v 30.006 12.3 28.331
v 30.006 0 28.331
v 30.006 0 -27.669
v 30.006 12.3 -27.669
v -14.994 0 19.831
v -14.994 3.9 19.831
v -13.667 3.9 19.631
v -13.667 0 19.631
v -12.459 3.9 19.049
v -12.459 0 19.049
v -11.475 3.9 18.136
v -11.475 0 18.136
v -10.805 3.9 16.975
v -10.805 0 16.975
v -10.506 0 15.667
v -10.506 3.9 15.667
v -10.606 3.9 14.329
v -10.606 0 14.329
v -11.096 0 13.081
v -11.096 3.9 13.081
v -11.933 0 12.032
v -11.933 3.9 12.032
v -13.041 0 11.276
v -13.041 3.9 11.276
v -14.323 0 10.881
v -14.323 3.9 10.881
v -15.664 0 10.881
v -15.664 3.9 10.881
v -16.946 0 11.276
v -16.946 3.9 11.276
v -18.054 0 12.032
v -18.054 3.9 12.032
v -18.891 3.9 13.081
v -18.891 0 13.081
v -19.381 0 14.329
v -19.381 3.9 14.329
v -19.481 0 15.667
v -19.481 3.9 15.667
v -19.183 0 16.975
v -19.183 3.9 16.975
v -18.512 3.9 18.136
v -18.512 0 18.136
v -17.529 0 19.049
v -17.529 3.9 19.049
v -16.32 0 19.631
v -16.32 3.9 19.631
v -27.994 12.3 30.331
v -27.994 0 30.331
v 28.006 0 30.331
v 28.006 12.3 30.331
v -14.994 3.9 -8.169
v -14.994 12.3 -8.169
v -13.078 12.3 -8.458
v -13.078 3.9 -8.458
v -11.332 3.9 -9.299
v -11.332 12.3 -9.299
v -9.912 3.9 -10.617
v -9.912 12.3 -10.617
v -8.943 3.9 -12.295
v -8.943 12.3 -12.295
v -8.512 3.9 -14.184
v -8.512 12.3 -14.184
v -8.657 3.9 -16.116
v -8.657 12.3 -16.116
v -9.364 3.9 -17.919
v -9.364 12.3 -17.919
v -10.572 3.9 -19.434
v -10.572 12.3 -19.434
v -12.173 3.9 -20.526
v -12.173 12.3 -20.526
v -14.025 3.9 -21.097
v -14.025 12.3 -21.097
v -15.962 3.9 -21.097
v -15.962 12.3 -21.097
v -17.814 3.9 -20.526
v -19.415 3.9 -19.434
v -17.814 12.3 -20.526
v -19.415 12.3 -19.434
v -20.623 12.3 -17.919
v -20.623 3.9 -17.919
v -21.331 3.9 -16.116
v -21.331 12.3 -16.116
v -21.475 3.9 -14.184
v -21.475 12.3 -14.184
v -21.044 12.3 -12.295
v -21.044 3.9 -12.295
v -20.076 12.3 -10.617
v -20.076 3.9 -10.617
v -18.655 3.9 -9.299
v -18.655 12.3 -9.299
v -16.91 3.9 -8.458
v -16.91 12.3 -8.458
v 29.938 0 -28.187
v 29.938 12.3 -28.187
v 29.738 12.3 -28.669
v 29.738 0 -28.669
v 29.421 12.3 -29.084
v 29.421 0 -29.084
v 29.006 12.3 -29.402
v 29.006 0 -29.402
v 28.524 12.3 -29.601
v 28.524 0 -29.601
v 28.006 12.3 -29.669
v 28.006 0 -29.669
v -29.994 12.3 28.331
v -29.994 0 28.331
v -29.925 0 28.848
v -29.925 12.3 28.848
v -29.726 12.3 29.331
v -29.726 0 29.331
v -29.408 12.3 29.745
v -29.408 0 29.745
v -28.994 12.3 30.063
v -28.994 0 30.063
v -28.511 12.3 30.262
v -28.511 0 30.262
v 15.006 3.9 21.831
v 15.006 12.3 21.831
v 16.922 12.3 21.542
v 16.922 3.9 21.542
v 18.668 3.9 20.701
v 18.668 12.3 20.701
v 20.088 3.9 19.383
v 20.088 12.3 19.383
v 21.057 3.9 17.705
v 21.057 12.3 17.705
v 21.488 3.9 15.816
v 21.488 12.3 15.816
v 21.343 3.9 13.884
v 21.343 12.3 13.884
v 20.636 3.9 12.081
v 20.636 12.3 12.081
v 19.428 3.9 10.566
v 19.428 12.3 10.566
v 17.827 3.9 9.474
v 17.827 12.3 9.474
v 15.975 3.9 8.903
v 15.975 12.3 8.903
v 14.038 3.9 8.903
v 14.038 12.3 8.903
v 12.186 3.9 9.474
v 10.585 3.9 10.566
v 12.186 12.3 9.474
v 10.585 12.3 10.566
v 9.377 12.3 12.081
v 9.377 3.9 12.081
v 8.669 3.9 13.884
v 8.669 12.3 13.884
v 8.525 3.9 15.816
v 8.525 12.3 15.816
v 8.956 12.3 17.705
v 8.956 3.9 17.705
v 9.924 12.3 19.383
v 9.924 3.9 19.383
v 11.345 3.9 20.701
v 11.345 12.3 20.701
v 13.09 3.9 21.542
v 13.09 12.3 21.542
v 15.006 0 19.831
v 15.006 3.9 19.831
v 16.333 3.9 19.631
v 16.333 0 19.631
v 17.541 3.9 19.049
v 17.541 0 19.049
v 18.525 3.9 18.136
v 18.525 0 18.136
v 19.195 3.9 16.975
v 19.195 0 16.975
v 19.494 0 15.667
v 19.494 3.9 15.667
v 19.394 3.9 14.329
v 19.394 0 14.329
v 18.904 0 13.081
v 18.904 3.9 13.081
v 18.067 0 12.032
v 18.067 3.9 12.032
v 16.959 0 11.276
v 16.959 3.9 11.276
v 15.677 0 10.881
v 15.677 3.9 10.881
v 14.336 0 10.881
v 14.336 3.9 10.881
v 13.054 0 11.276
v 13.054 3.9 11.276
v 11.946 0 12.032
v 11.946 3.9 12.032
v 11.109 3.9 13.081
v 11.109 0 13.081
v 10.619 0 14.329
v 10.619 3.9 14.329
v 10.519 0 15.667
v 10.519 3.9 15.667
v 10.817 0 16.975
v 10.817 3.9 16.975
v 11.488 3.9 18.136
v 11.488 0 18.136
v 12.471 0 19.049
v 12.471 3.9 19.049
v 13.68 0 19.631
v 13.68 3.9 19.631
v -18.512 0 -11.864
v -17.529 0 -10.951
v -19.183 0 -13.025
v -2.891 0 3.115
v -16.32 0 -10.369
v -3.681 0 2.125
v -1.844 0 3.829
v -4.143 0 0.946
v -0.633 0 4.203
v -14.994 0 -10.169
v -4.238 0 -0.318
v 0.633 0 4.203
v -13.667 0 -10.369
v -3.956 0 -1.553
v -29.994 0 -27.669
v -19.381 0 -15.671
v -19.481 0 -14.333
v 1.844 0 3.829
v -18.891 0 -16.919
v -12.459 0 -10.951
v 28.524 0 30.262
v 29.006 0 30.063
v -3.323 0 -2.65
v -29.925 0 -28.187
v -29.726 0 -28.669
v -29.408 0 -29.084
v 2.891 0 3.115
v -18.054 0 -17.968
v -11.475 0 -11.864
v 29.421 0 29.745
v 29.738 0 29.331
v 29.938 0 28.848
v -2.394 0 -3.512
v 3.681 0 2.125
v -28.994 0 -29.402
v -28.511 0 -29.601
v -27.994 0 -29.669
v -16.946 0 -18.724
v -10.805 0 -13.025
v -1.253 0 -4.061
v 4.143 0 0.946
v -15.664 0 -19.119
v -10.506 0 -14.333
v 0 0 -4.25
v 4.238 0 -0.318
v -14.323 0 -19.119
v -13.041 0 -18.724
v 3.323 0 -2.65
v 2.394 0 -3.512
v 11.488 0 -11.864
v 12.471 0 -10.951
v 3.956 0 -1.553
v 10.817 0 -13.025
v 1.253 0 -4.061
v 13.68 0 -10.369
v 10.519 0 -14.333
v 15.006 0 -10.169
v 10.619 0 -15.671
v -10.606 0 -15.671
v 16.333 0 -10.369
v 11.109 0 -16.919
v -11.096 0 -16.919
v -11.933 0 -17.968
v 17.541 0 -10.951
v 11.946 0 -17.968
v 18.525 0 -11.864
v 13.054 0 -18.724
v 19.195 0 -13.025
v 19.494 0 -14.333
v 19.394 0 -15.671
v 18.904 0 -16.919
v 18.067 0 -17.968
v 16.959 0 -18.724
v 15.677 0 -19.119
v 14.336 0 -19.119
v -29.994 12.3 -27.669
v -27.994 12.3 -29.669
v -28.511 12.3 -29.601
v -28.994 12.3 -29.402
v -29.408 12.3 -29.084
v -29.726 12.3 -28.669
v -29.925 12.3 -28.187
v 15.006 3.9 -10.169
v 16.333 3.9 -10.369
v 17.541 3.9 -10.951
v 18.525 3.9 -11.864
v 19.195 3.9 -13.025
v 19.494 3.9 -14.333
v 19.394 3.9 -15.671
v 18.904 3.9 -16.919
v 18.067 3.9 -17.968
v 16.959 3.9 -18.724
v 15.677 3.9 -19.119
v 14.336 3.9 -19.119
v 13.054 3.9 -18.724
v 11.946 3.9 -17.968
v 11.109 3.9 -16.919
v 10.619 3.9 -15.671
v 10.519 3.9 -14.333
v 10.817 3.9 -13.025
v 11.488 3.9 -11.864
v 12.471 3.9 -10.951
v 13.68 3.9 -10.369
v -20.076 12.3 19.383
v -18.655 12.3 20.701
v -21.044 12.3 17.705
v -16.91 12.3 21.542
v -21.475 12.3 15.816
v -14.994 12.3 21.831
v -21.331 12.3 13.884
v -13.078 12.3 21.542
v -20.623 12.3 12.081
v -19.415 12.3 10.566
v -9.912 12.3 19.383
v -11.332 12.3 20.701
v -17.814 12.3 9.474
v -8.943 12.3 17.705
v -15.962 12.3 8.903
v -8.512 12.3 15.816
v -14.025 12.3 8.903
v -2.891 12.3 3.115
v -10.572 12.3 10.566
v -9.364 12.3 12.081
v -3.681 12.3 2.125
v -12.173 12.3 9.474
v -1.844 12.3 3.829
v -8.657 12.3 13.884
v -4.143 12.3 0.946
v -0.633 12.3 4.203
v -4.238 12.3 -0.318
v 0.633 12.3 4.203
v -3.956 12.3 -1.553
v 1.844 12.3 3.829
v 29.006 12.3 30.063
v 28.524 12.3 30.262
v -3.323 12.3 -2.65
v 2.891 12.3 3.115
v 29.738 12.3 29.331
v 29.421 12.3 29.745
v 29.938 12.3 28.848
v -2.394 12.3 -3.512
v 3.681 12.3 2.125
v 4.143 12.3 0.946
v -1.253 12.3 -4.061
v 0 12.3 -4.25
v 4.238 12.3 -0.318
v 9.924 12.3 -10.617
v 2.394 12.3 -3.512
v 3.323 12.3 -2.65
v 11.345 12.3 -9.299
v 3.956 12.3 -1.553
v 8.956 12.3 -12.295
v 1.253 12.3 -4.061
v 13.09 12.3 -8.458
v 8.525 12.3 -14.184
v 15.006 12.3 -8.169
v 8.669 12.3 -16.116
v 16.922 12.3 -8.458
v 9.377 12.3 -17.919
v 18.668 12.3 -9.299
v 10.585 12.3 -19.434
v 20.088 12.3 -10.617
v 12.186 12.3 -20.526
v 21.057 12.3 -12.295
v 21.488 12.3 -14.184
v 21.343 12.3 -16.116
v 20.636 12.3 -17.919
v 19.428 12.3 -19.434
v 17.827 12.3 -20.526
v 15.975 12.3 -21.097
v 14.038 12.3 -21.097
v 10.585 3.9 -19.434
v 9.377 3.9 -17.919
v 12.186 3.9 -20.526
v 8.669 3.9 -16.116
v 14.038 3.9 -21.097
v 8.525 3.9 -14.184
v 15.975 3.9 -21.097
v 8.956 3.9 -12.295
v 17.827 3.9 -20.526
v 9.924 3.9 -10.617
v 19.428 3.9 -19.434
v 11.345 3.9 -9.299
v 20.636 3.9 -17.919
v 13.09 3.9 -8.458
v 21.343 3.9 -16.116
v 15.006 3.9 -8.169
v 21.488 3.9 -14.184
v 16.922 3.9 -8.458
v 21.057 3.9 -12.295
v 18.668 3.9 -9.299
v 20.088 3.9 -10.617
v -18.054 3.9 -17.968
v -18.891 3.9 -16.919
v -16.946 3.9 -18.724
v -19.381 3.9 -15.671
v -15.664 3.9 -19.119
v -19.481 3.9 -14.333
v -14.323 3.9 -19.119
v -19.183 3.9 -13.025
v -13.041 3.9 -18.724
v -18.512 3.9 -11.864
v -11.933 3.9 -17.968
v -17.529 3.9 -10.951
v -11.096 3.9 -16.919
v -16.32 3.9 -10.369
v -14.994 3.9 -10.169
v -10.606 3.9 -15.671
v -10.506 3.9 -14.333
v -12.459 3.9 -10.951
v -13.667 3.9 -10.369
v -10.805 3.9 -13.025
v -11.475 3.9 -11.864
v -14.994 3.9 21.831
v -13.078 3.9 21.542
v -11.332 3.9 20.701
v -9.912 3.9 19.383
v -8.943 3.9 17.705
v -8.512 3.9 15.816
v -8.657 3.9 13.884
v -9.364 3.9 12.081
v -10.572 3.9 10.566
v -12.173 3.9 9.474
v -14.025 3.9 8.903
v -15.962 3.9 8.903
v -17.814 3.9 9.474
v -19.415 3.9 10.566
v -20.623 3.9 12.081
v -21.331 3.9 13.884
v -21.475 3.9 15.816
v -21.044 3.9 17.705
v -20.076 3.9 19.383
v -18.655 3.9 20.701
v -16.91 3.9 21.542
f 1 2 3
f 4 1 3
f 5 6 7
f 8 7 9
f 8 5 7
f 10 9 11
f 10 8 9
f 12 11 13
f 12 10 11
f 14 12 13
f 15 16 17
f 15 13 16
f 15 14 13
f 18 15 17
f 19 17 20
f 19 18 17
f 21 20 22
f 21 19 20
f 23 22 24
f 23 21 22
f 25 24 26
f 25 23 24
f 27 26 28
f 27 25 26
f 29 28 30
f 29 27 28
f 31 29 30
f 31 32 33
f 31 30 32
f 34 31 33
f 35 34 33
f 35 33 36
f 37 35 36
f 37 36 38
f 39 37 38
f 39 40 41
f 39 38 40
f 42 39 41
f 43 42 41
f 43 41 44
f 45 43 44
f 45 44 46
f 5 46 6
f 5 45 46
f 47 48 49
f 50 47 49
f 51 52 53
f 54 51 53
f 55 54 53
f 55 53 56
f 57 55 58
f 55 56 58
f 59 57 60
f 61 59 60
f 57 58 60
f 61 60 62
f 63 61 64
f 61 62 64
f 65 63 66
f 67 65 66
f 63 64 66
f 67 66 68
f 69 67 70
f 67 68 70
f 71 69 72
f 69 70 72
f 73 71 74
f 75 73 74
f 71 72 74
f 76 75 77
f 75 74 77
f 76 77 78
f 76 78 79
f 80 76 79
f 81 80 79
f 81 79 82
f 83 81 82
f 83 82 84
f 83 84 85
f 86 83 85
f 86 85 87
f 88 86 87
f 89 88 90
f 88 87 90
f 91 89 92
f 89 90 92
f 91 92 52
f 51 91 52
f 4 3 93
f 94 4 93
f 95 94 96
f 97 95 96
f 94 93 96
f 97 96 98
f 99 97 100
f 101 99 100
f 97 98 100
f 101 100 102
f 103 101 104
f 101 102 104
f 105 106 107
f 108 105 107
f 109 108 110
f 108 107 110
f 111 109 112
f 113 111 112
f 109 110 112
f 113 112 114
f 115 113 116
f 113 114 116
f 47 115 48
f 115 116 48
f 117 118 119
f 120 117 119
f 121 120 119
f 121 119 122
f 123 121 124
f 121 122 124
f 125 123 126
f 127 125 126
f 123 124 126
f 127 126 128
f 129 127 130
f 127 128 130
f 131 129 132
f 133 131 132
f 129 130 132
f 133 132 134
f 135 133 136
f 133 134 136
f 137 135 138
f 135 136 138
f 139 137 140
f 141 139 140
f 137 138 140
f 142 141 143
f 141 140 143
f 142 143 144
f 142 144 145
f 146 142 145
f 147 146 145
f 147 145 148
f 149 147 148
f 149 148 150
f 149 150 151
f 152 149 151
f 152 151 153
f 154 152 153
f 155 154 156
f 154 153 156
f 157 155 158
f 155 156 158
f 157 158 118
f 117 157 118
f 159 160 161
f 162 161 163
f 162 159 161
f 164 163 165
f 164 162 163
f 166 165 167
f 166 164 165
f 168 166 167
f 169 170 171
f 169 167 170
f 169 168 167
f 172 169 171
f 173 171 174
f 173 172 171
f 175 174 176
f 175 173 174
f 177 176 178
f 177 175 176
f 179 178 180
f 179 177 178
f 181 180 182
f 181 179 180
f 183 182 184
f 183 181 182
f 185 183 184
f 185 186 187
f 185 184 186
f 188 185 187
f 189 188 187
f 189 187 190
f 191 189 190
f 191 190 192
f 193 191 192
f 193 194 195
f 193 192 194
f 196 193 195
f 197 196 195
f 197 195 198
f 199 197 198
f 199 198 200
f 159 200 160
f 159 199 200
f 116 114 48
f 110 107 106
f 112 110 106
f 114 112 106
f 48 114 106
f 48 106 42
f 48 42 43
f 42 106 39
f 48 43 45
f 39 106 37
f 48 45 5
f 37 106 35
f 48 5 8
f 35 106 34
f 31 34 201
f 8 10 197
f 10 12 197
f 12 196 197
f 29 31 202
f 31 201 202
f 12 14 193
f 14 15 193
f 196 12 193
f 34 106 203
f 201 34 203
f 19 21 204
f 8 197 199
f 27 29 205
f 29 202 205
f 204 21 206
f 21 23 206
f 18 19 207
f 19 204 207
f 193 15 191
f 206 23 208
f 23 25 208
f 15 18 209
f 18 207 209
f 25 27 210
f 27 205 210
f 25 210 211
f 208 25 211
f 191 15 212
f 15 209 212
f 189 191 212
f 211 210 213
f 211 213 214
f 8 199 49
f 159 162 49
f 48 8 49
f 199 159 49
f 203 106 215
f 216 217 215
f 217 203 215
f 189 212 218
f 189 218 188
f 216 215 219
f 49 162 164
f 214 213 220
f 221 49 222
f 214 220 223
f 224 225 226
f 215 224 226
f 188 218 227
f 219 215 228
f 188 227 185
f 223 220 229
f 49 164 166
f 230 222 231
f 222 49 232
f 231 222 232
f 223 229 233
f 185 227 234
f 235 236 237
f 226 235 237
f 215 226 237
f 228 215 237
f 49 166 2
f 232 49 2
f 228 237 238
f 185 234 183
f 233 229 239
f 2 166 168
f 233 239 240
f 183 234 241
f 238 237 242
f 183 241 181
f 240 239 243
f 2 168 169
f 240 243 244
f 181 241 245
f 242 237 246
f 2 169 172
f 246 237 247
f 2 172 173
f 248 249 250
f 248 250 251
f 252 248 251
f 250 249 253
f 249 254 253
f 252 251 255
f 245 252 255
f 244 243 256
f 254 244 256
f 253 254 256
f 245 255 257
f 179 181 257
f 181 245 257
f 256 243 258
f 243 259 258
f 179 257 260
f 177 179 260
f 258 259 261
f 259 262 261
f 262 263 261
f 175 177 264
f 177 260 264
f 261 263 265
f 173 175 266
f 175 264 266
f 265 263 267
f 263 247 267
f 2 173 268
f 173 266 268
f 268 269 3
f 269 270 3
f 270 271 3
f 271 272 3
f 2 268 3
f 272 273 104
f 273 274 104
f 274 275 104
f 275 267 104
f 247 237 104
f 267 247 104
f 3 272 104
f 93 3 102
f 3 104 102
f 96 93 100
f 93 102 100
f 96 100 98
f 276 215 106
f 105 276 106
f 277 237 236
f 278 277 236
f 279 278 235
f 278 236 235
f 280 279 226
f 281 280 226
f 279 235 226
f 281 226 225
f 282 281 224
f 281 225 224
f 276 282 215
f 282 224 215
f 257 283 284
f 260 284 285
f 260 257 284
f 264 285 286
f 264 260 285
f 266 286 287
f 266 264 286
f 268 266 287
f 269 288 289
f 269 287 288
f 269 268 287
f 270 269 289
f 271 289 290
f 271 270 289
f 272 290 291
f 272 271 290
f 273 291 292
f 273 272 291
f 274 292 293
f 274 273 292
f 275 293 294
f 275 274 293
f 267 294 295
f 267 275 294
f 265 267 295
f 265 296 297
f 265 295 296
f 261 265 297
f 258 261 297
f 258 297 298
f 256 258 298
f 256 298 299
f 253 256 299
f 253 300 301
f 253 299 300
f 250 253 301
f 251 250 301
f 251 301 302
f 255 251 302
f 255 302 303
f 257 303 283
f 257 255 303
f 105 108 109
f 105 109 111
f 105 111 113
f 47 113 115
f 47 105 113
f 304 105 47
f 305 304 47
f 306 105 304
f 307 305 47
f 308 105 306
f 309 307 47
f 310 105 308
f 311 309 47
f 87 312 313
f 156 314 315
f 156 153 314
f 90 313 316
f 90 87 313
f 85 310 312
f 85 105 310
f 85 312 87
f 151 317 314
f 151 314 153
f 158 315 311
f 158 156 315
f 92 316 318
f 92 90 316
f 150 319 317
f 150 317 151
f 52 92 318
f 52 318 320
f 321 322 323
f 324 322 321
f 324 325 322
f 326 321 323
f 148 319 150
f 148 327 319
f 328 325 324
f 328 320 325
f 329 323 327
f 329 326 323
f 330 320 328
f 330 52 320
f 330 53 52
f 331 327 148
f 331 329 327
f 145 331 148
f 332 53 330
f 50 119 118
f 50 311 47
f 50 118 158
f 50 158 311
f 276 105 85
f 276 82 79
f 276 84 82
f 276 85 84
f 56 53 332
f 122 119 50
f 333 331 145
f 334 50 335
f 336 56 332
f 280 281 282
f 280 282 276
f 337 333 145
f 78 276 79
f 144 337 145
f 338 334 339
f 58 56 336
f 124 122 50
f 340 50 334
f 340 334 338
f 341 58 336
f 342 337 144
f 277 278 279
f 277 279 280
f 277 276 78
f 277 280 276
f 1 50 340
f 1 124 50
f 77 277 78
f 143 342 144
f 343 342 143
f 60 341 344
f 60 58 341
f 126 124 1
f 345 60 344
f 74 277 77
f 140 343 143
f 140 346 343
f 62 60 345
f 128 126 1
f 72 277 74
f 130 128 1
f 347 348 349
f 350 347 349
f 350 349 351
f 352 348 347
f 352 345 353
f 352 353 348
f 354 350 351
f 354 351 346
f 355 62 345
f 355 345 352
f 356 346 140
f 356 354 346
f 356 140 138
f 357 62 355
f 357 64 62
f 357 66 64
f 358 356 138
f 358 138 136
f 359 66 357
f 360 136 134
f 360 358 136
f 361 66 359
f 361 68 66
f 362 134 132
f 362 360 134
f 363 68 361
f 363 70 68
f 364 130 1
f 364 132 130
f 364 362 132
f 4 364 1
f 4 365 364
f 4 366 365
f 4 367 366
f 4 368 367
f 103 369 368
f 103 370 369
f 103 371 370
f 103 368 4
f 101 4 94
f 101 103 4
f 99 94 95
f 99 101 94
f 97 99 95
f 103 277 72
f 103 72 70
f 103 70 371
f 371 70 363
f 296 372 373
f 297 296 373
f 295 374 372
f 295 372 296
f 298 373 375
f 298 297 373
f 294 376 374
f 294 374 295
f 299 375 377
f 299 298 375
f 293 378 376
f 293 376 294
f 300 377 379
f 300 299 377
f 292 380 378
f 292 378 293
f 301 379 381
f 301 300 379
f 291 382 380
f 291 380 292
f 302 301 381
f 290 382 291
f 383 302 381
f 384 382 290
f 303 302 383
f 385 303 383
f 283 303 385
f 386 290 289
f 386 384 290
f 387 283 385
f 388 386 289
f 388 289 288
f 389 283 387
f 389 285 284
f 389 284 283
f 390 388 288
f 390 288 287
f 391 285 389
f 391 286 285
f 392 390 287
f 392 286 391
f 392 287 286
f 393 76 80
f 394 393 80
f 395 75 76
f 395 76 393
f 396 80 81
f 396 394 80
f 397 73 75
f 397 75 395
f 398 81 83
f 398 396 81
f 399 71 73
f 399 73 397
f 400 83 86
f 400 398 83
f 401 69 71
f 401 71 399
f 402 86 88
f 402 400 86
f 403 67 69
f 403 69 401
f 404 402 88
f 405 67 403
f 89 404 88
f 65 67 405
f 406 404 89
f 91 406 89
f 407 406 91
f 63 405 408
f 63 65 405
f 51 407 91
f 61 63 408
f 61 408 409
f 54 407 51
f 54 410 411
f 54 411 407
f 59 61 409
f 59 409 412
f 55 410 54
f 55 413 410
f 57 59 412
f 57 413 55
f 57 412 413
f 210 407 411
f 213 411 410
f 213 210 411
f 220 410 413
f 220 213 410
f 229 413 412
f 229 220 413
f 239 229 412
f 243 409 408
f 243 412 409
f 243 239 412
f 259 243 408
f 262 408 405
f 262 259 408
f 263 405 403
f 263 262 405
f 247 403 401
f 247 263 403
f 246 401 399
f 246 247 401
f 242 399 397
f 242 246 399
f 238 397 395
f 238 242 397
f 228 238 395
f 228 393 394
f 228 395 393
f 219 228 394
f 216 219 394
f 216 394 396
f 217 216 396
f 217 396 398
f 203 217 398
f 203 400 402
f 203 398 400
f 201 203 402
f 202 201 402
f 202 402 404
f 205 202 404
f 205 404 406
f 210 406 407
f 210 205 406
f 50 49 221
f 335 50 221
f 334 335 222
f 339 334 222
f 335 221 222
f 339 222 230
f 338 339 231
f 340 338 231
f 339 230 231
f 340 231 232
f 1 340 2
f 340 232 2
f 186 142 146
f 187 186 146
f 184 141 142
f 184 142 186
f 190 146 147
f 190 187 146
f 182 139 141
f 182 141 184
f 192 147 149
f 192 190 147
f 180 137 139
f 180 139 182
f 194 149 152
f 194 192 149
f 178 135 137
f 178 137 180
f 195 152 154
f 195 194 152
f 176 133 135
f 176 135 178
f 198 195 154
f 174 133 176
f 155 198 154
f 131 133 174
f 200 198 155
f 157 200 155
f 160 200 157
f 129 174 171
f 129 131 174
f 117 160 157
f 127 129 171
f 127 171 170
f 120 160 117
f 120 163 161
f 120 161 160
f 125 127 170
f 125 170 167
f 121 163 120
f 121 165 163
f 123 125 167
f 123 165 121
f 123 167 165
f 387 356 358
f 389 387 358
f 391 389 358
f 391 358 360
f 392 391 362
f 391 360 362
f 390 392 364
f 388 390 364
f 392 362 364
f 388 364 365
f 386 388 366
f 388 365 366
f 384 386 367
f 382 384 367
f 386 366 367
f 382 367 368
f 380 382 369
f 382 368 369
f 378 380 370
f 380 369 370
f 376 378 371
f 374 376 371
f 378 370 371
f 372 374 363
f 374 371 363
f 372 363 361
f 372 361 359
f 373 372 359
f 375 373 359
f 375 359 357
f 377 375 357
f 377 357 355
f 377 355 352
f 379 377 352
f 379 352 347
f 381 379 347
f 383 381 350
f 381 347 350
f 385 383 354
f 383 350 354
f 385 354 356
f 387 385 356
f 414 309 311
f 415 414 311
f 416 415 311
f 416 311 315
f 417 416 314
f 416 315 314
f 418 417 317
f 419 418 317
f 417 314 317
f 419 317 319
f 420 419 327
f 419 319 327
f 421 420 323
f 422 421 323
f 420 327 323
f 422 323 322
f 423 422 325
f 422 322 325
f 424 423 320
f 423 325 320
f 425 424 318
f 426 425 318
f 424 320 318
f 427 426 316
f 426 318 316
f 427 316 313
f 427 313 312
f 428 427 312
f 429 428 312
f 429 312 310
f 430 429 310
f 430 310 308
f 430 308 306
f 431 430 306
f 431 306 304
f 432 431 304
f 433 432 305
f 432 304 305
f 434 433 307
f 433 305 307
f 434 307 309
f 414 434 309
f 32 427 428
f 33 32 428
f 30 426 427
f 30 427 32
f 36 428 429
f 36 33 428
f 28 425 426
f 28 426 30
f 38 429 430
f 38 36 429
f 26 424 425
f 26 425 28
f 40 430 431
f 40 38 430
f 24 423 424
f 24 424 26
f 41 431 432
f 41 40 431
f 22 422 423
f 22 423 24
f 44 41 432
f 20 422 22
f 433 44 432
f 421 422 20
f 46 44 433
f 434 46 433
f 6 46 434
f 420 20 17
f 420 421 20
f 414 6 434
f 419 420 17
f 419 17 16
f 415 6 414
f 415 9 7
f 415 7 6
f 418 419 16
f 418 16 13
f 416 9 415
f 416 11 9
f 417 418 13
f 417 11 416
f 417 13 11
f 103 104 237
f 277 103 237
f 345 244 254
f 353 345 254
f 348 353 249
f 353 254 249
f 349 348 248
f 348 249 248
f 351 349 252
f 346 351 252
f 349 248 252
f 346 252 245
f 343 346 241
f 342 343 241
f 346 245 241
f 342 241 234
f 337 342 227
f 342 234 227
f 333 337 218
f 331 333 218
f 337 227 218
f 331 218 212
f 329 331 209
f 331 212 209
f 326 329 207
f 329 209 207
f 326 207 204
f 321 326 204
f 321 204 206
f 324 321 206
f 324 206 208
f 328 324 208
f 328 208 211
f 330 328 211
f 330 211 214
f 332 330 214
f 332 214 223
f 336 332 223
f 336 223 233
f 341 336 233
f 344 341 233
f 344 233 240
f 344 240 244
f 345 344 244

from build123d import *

# Parameters (mm, degrees)
SKETCH_1_R              = 4.5
EXTRUDE_1_DEPTH         = 12.3
HOLE_WIZARD_M10_1_D     = 8.5
HOLE_WIZARD_M10_1_DEPTH = 24.5
HOLE_WIZARD_M10_1_TIP   = 2.553657631
SKETCH_5_R              = 6.5
CUT_EXTRUDE_1_DEPTH     = 8.4


with BuildPart() as part:
    # 草图1 → 凸台-拉伸1 (new body)
    with BuildSketch(Plane(origin=(0, 0, 0), x_dir=(1, 0, 0), z_dir=(0, 1, 0))):
        with BuildLine():
            Line((-27.993607343, -30.330536434), (28.006392657, -30.330536434))
            ThreePointArc((28.006392657, -30.330536434), (29.42060622, -29.744749996), (30.006392657, -28.330536434))
            Line((30.006392657, -28.330536434), (30.006392657, 27.669463566))
            ThreePointArc((30.006392657, 27.669463566), (29.42060622, 29.083677128), (28.006392657, 29.669463566))
            Line((28.006392657, 29.669463566), (-27.993607343, 29.669463566))
            ThreePointArc((-27.993607343, 29.669463566), (-29.407820905, 29.083677128), (-29.993607343, 27.669463566))
            Line((-29.993607343, 27.669463566), (-29.993607343, -28.330536434))
            ThreePointArc((-29.993607343, -28.330536434), (-29.407820905, -29.744749996), (-27.993607343, -30.330536434))
        make_face()
        with Locations(Location((15.006392657, -15.330536434, 0), (0, 0, 270))):
            Circle(SKETCH_1_R, mode=Mode.SUBTRACT)
        with Locations(Location((15.006392657, 14.669463566, 0), (0, 0, 270))):
            Circle(SKETCH_1_R, mode=Mode.SUBTRACT)
        with Locations(Location((-14.993607343, 14.669463566, 0), (0, 0, 270))):
            Circle(SKETCH_1_R, mode=Mode.SUBTRACT)
        with Locations(Location((-14.993607343, -15.330536434, 0), (0, 0, 270))):
            Circle(SKETCH_1_R, mode=Mode.SUBTRACT)
    extrude(amount=EXTRUDE_1_DEPTH)

    # M10 螺纹孔1
    with Locations(Plane.ZX.offset(12.3)):
        with Locations((0, 0)):
            Hole(HOLE_WIZARD_M10_1_D / 2, depth=HOLE_WIZARD_M10_1_DEPTH)
            with Locations((0, 0, -(HOLE_WIZARD_M10_1_DEPTH + HOLE_WIZARD_M10_1_TIP / 2))):  # 118° drill point
                Cone(0, HOLE_WIZARD_M10_1_D / 2, HOLE_WIZARD_M10_1_TIP, mode=Mode.SUBTRACT)

    # 草图5 → 切除-拉伸1 (cut)
    with BuildSketch(Plane(origin=(0, 12.3, 0), x_dir=(1, 0, 0), z_dir=(0, 1, 0))):
        with Locations(Location((-14.993607343, 14.669463566, 0), (0, 0, 270))):
            Circle(SKETCH_5_R)
        with Locations(Location((15.006392657, 14.669463566, 0), (0, 0, 270))):
            Circle(SKETCH_5_R)
        with Locations(Location((15.006392657, -15.330536434, 0), (0, 0, 270))):
            Circle(SKETCH_5_R)
        with Locations(Location((-14.993607343, -15.330536434, 0), (0, 0, 270))):
            Circle(SKETCH_5_R)
    extrude(amount=-CUT_EXTRUDE_1_DEPTH, mode=Mode.SUBTRACT)


solid = part.part
